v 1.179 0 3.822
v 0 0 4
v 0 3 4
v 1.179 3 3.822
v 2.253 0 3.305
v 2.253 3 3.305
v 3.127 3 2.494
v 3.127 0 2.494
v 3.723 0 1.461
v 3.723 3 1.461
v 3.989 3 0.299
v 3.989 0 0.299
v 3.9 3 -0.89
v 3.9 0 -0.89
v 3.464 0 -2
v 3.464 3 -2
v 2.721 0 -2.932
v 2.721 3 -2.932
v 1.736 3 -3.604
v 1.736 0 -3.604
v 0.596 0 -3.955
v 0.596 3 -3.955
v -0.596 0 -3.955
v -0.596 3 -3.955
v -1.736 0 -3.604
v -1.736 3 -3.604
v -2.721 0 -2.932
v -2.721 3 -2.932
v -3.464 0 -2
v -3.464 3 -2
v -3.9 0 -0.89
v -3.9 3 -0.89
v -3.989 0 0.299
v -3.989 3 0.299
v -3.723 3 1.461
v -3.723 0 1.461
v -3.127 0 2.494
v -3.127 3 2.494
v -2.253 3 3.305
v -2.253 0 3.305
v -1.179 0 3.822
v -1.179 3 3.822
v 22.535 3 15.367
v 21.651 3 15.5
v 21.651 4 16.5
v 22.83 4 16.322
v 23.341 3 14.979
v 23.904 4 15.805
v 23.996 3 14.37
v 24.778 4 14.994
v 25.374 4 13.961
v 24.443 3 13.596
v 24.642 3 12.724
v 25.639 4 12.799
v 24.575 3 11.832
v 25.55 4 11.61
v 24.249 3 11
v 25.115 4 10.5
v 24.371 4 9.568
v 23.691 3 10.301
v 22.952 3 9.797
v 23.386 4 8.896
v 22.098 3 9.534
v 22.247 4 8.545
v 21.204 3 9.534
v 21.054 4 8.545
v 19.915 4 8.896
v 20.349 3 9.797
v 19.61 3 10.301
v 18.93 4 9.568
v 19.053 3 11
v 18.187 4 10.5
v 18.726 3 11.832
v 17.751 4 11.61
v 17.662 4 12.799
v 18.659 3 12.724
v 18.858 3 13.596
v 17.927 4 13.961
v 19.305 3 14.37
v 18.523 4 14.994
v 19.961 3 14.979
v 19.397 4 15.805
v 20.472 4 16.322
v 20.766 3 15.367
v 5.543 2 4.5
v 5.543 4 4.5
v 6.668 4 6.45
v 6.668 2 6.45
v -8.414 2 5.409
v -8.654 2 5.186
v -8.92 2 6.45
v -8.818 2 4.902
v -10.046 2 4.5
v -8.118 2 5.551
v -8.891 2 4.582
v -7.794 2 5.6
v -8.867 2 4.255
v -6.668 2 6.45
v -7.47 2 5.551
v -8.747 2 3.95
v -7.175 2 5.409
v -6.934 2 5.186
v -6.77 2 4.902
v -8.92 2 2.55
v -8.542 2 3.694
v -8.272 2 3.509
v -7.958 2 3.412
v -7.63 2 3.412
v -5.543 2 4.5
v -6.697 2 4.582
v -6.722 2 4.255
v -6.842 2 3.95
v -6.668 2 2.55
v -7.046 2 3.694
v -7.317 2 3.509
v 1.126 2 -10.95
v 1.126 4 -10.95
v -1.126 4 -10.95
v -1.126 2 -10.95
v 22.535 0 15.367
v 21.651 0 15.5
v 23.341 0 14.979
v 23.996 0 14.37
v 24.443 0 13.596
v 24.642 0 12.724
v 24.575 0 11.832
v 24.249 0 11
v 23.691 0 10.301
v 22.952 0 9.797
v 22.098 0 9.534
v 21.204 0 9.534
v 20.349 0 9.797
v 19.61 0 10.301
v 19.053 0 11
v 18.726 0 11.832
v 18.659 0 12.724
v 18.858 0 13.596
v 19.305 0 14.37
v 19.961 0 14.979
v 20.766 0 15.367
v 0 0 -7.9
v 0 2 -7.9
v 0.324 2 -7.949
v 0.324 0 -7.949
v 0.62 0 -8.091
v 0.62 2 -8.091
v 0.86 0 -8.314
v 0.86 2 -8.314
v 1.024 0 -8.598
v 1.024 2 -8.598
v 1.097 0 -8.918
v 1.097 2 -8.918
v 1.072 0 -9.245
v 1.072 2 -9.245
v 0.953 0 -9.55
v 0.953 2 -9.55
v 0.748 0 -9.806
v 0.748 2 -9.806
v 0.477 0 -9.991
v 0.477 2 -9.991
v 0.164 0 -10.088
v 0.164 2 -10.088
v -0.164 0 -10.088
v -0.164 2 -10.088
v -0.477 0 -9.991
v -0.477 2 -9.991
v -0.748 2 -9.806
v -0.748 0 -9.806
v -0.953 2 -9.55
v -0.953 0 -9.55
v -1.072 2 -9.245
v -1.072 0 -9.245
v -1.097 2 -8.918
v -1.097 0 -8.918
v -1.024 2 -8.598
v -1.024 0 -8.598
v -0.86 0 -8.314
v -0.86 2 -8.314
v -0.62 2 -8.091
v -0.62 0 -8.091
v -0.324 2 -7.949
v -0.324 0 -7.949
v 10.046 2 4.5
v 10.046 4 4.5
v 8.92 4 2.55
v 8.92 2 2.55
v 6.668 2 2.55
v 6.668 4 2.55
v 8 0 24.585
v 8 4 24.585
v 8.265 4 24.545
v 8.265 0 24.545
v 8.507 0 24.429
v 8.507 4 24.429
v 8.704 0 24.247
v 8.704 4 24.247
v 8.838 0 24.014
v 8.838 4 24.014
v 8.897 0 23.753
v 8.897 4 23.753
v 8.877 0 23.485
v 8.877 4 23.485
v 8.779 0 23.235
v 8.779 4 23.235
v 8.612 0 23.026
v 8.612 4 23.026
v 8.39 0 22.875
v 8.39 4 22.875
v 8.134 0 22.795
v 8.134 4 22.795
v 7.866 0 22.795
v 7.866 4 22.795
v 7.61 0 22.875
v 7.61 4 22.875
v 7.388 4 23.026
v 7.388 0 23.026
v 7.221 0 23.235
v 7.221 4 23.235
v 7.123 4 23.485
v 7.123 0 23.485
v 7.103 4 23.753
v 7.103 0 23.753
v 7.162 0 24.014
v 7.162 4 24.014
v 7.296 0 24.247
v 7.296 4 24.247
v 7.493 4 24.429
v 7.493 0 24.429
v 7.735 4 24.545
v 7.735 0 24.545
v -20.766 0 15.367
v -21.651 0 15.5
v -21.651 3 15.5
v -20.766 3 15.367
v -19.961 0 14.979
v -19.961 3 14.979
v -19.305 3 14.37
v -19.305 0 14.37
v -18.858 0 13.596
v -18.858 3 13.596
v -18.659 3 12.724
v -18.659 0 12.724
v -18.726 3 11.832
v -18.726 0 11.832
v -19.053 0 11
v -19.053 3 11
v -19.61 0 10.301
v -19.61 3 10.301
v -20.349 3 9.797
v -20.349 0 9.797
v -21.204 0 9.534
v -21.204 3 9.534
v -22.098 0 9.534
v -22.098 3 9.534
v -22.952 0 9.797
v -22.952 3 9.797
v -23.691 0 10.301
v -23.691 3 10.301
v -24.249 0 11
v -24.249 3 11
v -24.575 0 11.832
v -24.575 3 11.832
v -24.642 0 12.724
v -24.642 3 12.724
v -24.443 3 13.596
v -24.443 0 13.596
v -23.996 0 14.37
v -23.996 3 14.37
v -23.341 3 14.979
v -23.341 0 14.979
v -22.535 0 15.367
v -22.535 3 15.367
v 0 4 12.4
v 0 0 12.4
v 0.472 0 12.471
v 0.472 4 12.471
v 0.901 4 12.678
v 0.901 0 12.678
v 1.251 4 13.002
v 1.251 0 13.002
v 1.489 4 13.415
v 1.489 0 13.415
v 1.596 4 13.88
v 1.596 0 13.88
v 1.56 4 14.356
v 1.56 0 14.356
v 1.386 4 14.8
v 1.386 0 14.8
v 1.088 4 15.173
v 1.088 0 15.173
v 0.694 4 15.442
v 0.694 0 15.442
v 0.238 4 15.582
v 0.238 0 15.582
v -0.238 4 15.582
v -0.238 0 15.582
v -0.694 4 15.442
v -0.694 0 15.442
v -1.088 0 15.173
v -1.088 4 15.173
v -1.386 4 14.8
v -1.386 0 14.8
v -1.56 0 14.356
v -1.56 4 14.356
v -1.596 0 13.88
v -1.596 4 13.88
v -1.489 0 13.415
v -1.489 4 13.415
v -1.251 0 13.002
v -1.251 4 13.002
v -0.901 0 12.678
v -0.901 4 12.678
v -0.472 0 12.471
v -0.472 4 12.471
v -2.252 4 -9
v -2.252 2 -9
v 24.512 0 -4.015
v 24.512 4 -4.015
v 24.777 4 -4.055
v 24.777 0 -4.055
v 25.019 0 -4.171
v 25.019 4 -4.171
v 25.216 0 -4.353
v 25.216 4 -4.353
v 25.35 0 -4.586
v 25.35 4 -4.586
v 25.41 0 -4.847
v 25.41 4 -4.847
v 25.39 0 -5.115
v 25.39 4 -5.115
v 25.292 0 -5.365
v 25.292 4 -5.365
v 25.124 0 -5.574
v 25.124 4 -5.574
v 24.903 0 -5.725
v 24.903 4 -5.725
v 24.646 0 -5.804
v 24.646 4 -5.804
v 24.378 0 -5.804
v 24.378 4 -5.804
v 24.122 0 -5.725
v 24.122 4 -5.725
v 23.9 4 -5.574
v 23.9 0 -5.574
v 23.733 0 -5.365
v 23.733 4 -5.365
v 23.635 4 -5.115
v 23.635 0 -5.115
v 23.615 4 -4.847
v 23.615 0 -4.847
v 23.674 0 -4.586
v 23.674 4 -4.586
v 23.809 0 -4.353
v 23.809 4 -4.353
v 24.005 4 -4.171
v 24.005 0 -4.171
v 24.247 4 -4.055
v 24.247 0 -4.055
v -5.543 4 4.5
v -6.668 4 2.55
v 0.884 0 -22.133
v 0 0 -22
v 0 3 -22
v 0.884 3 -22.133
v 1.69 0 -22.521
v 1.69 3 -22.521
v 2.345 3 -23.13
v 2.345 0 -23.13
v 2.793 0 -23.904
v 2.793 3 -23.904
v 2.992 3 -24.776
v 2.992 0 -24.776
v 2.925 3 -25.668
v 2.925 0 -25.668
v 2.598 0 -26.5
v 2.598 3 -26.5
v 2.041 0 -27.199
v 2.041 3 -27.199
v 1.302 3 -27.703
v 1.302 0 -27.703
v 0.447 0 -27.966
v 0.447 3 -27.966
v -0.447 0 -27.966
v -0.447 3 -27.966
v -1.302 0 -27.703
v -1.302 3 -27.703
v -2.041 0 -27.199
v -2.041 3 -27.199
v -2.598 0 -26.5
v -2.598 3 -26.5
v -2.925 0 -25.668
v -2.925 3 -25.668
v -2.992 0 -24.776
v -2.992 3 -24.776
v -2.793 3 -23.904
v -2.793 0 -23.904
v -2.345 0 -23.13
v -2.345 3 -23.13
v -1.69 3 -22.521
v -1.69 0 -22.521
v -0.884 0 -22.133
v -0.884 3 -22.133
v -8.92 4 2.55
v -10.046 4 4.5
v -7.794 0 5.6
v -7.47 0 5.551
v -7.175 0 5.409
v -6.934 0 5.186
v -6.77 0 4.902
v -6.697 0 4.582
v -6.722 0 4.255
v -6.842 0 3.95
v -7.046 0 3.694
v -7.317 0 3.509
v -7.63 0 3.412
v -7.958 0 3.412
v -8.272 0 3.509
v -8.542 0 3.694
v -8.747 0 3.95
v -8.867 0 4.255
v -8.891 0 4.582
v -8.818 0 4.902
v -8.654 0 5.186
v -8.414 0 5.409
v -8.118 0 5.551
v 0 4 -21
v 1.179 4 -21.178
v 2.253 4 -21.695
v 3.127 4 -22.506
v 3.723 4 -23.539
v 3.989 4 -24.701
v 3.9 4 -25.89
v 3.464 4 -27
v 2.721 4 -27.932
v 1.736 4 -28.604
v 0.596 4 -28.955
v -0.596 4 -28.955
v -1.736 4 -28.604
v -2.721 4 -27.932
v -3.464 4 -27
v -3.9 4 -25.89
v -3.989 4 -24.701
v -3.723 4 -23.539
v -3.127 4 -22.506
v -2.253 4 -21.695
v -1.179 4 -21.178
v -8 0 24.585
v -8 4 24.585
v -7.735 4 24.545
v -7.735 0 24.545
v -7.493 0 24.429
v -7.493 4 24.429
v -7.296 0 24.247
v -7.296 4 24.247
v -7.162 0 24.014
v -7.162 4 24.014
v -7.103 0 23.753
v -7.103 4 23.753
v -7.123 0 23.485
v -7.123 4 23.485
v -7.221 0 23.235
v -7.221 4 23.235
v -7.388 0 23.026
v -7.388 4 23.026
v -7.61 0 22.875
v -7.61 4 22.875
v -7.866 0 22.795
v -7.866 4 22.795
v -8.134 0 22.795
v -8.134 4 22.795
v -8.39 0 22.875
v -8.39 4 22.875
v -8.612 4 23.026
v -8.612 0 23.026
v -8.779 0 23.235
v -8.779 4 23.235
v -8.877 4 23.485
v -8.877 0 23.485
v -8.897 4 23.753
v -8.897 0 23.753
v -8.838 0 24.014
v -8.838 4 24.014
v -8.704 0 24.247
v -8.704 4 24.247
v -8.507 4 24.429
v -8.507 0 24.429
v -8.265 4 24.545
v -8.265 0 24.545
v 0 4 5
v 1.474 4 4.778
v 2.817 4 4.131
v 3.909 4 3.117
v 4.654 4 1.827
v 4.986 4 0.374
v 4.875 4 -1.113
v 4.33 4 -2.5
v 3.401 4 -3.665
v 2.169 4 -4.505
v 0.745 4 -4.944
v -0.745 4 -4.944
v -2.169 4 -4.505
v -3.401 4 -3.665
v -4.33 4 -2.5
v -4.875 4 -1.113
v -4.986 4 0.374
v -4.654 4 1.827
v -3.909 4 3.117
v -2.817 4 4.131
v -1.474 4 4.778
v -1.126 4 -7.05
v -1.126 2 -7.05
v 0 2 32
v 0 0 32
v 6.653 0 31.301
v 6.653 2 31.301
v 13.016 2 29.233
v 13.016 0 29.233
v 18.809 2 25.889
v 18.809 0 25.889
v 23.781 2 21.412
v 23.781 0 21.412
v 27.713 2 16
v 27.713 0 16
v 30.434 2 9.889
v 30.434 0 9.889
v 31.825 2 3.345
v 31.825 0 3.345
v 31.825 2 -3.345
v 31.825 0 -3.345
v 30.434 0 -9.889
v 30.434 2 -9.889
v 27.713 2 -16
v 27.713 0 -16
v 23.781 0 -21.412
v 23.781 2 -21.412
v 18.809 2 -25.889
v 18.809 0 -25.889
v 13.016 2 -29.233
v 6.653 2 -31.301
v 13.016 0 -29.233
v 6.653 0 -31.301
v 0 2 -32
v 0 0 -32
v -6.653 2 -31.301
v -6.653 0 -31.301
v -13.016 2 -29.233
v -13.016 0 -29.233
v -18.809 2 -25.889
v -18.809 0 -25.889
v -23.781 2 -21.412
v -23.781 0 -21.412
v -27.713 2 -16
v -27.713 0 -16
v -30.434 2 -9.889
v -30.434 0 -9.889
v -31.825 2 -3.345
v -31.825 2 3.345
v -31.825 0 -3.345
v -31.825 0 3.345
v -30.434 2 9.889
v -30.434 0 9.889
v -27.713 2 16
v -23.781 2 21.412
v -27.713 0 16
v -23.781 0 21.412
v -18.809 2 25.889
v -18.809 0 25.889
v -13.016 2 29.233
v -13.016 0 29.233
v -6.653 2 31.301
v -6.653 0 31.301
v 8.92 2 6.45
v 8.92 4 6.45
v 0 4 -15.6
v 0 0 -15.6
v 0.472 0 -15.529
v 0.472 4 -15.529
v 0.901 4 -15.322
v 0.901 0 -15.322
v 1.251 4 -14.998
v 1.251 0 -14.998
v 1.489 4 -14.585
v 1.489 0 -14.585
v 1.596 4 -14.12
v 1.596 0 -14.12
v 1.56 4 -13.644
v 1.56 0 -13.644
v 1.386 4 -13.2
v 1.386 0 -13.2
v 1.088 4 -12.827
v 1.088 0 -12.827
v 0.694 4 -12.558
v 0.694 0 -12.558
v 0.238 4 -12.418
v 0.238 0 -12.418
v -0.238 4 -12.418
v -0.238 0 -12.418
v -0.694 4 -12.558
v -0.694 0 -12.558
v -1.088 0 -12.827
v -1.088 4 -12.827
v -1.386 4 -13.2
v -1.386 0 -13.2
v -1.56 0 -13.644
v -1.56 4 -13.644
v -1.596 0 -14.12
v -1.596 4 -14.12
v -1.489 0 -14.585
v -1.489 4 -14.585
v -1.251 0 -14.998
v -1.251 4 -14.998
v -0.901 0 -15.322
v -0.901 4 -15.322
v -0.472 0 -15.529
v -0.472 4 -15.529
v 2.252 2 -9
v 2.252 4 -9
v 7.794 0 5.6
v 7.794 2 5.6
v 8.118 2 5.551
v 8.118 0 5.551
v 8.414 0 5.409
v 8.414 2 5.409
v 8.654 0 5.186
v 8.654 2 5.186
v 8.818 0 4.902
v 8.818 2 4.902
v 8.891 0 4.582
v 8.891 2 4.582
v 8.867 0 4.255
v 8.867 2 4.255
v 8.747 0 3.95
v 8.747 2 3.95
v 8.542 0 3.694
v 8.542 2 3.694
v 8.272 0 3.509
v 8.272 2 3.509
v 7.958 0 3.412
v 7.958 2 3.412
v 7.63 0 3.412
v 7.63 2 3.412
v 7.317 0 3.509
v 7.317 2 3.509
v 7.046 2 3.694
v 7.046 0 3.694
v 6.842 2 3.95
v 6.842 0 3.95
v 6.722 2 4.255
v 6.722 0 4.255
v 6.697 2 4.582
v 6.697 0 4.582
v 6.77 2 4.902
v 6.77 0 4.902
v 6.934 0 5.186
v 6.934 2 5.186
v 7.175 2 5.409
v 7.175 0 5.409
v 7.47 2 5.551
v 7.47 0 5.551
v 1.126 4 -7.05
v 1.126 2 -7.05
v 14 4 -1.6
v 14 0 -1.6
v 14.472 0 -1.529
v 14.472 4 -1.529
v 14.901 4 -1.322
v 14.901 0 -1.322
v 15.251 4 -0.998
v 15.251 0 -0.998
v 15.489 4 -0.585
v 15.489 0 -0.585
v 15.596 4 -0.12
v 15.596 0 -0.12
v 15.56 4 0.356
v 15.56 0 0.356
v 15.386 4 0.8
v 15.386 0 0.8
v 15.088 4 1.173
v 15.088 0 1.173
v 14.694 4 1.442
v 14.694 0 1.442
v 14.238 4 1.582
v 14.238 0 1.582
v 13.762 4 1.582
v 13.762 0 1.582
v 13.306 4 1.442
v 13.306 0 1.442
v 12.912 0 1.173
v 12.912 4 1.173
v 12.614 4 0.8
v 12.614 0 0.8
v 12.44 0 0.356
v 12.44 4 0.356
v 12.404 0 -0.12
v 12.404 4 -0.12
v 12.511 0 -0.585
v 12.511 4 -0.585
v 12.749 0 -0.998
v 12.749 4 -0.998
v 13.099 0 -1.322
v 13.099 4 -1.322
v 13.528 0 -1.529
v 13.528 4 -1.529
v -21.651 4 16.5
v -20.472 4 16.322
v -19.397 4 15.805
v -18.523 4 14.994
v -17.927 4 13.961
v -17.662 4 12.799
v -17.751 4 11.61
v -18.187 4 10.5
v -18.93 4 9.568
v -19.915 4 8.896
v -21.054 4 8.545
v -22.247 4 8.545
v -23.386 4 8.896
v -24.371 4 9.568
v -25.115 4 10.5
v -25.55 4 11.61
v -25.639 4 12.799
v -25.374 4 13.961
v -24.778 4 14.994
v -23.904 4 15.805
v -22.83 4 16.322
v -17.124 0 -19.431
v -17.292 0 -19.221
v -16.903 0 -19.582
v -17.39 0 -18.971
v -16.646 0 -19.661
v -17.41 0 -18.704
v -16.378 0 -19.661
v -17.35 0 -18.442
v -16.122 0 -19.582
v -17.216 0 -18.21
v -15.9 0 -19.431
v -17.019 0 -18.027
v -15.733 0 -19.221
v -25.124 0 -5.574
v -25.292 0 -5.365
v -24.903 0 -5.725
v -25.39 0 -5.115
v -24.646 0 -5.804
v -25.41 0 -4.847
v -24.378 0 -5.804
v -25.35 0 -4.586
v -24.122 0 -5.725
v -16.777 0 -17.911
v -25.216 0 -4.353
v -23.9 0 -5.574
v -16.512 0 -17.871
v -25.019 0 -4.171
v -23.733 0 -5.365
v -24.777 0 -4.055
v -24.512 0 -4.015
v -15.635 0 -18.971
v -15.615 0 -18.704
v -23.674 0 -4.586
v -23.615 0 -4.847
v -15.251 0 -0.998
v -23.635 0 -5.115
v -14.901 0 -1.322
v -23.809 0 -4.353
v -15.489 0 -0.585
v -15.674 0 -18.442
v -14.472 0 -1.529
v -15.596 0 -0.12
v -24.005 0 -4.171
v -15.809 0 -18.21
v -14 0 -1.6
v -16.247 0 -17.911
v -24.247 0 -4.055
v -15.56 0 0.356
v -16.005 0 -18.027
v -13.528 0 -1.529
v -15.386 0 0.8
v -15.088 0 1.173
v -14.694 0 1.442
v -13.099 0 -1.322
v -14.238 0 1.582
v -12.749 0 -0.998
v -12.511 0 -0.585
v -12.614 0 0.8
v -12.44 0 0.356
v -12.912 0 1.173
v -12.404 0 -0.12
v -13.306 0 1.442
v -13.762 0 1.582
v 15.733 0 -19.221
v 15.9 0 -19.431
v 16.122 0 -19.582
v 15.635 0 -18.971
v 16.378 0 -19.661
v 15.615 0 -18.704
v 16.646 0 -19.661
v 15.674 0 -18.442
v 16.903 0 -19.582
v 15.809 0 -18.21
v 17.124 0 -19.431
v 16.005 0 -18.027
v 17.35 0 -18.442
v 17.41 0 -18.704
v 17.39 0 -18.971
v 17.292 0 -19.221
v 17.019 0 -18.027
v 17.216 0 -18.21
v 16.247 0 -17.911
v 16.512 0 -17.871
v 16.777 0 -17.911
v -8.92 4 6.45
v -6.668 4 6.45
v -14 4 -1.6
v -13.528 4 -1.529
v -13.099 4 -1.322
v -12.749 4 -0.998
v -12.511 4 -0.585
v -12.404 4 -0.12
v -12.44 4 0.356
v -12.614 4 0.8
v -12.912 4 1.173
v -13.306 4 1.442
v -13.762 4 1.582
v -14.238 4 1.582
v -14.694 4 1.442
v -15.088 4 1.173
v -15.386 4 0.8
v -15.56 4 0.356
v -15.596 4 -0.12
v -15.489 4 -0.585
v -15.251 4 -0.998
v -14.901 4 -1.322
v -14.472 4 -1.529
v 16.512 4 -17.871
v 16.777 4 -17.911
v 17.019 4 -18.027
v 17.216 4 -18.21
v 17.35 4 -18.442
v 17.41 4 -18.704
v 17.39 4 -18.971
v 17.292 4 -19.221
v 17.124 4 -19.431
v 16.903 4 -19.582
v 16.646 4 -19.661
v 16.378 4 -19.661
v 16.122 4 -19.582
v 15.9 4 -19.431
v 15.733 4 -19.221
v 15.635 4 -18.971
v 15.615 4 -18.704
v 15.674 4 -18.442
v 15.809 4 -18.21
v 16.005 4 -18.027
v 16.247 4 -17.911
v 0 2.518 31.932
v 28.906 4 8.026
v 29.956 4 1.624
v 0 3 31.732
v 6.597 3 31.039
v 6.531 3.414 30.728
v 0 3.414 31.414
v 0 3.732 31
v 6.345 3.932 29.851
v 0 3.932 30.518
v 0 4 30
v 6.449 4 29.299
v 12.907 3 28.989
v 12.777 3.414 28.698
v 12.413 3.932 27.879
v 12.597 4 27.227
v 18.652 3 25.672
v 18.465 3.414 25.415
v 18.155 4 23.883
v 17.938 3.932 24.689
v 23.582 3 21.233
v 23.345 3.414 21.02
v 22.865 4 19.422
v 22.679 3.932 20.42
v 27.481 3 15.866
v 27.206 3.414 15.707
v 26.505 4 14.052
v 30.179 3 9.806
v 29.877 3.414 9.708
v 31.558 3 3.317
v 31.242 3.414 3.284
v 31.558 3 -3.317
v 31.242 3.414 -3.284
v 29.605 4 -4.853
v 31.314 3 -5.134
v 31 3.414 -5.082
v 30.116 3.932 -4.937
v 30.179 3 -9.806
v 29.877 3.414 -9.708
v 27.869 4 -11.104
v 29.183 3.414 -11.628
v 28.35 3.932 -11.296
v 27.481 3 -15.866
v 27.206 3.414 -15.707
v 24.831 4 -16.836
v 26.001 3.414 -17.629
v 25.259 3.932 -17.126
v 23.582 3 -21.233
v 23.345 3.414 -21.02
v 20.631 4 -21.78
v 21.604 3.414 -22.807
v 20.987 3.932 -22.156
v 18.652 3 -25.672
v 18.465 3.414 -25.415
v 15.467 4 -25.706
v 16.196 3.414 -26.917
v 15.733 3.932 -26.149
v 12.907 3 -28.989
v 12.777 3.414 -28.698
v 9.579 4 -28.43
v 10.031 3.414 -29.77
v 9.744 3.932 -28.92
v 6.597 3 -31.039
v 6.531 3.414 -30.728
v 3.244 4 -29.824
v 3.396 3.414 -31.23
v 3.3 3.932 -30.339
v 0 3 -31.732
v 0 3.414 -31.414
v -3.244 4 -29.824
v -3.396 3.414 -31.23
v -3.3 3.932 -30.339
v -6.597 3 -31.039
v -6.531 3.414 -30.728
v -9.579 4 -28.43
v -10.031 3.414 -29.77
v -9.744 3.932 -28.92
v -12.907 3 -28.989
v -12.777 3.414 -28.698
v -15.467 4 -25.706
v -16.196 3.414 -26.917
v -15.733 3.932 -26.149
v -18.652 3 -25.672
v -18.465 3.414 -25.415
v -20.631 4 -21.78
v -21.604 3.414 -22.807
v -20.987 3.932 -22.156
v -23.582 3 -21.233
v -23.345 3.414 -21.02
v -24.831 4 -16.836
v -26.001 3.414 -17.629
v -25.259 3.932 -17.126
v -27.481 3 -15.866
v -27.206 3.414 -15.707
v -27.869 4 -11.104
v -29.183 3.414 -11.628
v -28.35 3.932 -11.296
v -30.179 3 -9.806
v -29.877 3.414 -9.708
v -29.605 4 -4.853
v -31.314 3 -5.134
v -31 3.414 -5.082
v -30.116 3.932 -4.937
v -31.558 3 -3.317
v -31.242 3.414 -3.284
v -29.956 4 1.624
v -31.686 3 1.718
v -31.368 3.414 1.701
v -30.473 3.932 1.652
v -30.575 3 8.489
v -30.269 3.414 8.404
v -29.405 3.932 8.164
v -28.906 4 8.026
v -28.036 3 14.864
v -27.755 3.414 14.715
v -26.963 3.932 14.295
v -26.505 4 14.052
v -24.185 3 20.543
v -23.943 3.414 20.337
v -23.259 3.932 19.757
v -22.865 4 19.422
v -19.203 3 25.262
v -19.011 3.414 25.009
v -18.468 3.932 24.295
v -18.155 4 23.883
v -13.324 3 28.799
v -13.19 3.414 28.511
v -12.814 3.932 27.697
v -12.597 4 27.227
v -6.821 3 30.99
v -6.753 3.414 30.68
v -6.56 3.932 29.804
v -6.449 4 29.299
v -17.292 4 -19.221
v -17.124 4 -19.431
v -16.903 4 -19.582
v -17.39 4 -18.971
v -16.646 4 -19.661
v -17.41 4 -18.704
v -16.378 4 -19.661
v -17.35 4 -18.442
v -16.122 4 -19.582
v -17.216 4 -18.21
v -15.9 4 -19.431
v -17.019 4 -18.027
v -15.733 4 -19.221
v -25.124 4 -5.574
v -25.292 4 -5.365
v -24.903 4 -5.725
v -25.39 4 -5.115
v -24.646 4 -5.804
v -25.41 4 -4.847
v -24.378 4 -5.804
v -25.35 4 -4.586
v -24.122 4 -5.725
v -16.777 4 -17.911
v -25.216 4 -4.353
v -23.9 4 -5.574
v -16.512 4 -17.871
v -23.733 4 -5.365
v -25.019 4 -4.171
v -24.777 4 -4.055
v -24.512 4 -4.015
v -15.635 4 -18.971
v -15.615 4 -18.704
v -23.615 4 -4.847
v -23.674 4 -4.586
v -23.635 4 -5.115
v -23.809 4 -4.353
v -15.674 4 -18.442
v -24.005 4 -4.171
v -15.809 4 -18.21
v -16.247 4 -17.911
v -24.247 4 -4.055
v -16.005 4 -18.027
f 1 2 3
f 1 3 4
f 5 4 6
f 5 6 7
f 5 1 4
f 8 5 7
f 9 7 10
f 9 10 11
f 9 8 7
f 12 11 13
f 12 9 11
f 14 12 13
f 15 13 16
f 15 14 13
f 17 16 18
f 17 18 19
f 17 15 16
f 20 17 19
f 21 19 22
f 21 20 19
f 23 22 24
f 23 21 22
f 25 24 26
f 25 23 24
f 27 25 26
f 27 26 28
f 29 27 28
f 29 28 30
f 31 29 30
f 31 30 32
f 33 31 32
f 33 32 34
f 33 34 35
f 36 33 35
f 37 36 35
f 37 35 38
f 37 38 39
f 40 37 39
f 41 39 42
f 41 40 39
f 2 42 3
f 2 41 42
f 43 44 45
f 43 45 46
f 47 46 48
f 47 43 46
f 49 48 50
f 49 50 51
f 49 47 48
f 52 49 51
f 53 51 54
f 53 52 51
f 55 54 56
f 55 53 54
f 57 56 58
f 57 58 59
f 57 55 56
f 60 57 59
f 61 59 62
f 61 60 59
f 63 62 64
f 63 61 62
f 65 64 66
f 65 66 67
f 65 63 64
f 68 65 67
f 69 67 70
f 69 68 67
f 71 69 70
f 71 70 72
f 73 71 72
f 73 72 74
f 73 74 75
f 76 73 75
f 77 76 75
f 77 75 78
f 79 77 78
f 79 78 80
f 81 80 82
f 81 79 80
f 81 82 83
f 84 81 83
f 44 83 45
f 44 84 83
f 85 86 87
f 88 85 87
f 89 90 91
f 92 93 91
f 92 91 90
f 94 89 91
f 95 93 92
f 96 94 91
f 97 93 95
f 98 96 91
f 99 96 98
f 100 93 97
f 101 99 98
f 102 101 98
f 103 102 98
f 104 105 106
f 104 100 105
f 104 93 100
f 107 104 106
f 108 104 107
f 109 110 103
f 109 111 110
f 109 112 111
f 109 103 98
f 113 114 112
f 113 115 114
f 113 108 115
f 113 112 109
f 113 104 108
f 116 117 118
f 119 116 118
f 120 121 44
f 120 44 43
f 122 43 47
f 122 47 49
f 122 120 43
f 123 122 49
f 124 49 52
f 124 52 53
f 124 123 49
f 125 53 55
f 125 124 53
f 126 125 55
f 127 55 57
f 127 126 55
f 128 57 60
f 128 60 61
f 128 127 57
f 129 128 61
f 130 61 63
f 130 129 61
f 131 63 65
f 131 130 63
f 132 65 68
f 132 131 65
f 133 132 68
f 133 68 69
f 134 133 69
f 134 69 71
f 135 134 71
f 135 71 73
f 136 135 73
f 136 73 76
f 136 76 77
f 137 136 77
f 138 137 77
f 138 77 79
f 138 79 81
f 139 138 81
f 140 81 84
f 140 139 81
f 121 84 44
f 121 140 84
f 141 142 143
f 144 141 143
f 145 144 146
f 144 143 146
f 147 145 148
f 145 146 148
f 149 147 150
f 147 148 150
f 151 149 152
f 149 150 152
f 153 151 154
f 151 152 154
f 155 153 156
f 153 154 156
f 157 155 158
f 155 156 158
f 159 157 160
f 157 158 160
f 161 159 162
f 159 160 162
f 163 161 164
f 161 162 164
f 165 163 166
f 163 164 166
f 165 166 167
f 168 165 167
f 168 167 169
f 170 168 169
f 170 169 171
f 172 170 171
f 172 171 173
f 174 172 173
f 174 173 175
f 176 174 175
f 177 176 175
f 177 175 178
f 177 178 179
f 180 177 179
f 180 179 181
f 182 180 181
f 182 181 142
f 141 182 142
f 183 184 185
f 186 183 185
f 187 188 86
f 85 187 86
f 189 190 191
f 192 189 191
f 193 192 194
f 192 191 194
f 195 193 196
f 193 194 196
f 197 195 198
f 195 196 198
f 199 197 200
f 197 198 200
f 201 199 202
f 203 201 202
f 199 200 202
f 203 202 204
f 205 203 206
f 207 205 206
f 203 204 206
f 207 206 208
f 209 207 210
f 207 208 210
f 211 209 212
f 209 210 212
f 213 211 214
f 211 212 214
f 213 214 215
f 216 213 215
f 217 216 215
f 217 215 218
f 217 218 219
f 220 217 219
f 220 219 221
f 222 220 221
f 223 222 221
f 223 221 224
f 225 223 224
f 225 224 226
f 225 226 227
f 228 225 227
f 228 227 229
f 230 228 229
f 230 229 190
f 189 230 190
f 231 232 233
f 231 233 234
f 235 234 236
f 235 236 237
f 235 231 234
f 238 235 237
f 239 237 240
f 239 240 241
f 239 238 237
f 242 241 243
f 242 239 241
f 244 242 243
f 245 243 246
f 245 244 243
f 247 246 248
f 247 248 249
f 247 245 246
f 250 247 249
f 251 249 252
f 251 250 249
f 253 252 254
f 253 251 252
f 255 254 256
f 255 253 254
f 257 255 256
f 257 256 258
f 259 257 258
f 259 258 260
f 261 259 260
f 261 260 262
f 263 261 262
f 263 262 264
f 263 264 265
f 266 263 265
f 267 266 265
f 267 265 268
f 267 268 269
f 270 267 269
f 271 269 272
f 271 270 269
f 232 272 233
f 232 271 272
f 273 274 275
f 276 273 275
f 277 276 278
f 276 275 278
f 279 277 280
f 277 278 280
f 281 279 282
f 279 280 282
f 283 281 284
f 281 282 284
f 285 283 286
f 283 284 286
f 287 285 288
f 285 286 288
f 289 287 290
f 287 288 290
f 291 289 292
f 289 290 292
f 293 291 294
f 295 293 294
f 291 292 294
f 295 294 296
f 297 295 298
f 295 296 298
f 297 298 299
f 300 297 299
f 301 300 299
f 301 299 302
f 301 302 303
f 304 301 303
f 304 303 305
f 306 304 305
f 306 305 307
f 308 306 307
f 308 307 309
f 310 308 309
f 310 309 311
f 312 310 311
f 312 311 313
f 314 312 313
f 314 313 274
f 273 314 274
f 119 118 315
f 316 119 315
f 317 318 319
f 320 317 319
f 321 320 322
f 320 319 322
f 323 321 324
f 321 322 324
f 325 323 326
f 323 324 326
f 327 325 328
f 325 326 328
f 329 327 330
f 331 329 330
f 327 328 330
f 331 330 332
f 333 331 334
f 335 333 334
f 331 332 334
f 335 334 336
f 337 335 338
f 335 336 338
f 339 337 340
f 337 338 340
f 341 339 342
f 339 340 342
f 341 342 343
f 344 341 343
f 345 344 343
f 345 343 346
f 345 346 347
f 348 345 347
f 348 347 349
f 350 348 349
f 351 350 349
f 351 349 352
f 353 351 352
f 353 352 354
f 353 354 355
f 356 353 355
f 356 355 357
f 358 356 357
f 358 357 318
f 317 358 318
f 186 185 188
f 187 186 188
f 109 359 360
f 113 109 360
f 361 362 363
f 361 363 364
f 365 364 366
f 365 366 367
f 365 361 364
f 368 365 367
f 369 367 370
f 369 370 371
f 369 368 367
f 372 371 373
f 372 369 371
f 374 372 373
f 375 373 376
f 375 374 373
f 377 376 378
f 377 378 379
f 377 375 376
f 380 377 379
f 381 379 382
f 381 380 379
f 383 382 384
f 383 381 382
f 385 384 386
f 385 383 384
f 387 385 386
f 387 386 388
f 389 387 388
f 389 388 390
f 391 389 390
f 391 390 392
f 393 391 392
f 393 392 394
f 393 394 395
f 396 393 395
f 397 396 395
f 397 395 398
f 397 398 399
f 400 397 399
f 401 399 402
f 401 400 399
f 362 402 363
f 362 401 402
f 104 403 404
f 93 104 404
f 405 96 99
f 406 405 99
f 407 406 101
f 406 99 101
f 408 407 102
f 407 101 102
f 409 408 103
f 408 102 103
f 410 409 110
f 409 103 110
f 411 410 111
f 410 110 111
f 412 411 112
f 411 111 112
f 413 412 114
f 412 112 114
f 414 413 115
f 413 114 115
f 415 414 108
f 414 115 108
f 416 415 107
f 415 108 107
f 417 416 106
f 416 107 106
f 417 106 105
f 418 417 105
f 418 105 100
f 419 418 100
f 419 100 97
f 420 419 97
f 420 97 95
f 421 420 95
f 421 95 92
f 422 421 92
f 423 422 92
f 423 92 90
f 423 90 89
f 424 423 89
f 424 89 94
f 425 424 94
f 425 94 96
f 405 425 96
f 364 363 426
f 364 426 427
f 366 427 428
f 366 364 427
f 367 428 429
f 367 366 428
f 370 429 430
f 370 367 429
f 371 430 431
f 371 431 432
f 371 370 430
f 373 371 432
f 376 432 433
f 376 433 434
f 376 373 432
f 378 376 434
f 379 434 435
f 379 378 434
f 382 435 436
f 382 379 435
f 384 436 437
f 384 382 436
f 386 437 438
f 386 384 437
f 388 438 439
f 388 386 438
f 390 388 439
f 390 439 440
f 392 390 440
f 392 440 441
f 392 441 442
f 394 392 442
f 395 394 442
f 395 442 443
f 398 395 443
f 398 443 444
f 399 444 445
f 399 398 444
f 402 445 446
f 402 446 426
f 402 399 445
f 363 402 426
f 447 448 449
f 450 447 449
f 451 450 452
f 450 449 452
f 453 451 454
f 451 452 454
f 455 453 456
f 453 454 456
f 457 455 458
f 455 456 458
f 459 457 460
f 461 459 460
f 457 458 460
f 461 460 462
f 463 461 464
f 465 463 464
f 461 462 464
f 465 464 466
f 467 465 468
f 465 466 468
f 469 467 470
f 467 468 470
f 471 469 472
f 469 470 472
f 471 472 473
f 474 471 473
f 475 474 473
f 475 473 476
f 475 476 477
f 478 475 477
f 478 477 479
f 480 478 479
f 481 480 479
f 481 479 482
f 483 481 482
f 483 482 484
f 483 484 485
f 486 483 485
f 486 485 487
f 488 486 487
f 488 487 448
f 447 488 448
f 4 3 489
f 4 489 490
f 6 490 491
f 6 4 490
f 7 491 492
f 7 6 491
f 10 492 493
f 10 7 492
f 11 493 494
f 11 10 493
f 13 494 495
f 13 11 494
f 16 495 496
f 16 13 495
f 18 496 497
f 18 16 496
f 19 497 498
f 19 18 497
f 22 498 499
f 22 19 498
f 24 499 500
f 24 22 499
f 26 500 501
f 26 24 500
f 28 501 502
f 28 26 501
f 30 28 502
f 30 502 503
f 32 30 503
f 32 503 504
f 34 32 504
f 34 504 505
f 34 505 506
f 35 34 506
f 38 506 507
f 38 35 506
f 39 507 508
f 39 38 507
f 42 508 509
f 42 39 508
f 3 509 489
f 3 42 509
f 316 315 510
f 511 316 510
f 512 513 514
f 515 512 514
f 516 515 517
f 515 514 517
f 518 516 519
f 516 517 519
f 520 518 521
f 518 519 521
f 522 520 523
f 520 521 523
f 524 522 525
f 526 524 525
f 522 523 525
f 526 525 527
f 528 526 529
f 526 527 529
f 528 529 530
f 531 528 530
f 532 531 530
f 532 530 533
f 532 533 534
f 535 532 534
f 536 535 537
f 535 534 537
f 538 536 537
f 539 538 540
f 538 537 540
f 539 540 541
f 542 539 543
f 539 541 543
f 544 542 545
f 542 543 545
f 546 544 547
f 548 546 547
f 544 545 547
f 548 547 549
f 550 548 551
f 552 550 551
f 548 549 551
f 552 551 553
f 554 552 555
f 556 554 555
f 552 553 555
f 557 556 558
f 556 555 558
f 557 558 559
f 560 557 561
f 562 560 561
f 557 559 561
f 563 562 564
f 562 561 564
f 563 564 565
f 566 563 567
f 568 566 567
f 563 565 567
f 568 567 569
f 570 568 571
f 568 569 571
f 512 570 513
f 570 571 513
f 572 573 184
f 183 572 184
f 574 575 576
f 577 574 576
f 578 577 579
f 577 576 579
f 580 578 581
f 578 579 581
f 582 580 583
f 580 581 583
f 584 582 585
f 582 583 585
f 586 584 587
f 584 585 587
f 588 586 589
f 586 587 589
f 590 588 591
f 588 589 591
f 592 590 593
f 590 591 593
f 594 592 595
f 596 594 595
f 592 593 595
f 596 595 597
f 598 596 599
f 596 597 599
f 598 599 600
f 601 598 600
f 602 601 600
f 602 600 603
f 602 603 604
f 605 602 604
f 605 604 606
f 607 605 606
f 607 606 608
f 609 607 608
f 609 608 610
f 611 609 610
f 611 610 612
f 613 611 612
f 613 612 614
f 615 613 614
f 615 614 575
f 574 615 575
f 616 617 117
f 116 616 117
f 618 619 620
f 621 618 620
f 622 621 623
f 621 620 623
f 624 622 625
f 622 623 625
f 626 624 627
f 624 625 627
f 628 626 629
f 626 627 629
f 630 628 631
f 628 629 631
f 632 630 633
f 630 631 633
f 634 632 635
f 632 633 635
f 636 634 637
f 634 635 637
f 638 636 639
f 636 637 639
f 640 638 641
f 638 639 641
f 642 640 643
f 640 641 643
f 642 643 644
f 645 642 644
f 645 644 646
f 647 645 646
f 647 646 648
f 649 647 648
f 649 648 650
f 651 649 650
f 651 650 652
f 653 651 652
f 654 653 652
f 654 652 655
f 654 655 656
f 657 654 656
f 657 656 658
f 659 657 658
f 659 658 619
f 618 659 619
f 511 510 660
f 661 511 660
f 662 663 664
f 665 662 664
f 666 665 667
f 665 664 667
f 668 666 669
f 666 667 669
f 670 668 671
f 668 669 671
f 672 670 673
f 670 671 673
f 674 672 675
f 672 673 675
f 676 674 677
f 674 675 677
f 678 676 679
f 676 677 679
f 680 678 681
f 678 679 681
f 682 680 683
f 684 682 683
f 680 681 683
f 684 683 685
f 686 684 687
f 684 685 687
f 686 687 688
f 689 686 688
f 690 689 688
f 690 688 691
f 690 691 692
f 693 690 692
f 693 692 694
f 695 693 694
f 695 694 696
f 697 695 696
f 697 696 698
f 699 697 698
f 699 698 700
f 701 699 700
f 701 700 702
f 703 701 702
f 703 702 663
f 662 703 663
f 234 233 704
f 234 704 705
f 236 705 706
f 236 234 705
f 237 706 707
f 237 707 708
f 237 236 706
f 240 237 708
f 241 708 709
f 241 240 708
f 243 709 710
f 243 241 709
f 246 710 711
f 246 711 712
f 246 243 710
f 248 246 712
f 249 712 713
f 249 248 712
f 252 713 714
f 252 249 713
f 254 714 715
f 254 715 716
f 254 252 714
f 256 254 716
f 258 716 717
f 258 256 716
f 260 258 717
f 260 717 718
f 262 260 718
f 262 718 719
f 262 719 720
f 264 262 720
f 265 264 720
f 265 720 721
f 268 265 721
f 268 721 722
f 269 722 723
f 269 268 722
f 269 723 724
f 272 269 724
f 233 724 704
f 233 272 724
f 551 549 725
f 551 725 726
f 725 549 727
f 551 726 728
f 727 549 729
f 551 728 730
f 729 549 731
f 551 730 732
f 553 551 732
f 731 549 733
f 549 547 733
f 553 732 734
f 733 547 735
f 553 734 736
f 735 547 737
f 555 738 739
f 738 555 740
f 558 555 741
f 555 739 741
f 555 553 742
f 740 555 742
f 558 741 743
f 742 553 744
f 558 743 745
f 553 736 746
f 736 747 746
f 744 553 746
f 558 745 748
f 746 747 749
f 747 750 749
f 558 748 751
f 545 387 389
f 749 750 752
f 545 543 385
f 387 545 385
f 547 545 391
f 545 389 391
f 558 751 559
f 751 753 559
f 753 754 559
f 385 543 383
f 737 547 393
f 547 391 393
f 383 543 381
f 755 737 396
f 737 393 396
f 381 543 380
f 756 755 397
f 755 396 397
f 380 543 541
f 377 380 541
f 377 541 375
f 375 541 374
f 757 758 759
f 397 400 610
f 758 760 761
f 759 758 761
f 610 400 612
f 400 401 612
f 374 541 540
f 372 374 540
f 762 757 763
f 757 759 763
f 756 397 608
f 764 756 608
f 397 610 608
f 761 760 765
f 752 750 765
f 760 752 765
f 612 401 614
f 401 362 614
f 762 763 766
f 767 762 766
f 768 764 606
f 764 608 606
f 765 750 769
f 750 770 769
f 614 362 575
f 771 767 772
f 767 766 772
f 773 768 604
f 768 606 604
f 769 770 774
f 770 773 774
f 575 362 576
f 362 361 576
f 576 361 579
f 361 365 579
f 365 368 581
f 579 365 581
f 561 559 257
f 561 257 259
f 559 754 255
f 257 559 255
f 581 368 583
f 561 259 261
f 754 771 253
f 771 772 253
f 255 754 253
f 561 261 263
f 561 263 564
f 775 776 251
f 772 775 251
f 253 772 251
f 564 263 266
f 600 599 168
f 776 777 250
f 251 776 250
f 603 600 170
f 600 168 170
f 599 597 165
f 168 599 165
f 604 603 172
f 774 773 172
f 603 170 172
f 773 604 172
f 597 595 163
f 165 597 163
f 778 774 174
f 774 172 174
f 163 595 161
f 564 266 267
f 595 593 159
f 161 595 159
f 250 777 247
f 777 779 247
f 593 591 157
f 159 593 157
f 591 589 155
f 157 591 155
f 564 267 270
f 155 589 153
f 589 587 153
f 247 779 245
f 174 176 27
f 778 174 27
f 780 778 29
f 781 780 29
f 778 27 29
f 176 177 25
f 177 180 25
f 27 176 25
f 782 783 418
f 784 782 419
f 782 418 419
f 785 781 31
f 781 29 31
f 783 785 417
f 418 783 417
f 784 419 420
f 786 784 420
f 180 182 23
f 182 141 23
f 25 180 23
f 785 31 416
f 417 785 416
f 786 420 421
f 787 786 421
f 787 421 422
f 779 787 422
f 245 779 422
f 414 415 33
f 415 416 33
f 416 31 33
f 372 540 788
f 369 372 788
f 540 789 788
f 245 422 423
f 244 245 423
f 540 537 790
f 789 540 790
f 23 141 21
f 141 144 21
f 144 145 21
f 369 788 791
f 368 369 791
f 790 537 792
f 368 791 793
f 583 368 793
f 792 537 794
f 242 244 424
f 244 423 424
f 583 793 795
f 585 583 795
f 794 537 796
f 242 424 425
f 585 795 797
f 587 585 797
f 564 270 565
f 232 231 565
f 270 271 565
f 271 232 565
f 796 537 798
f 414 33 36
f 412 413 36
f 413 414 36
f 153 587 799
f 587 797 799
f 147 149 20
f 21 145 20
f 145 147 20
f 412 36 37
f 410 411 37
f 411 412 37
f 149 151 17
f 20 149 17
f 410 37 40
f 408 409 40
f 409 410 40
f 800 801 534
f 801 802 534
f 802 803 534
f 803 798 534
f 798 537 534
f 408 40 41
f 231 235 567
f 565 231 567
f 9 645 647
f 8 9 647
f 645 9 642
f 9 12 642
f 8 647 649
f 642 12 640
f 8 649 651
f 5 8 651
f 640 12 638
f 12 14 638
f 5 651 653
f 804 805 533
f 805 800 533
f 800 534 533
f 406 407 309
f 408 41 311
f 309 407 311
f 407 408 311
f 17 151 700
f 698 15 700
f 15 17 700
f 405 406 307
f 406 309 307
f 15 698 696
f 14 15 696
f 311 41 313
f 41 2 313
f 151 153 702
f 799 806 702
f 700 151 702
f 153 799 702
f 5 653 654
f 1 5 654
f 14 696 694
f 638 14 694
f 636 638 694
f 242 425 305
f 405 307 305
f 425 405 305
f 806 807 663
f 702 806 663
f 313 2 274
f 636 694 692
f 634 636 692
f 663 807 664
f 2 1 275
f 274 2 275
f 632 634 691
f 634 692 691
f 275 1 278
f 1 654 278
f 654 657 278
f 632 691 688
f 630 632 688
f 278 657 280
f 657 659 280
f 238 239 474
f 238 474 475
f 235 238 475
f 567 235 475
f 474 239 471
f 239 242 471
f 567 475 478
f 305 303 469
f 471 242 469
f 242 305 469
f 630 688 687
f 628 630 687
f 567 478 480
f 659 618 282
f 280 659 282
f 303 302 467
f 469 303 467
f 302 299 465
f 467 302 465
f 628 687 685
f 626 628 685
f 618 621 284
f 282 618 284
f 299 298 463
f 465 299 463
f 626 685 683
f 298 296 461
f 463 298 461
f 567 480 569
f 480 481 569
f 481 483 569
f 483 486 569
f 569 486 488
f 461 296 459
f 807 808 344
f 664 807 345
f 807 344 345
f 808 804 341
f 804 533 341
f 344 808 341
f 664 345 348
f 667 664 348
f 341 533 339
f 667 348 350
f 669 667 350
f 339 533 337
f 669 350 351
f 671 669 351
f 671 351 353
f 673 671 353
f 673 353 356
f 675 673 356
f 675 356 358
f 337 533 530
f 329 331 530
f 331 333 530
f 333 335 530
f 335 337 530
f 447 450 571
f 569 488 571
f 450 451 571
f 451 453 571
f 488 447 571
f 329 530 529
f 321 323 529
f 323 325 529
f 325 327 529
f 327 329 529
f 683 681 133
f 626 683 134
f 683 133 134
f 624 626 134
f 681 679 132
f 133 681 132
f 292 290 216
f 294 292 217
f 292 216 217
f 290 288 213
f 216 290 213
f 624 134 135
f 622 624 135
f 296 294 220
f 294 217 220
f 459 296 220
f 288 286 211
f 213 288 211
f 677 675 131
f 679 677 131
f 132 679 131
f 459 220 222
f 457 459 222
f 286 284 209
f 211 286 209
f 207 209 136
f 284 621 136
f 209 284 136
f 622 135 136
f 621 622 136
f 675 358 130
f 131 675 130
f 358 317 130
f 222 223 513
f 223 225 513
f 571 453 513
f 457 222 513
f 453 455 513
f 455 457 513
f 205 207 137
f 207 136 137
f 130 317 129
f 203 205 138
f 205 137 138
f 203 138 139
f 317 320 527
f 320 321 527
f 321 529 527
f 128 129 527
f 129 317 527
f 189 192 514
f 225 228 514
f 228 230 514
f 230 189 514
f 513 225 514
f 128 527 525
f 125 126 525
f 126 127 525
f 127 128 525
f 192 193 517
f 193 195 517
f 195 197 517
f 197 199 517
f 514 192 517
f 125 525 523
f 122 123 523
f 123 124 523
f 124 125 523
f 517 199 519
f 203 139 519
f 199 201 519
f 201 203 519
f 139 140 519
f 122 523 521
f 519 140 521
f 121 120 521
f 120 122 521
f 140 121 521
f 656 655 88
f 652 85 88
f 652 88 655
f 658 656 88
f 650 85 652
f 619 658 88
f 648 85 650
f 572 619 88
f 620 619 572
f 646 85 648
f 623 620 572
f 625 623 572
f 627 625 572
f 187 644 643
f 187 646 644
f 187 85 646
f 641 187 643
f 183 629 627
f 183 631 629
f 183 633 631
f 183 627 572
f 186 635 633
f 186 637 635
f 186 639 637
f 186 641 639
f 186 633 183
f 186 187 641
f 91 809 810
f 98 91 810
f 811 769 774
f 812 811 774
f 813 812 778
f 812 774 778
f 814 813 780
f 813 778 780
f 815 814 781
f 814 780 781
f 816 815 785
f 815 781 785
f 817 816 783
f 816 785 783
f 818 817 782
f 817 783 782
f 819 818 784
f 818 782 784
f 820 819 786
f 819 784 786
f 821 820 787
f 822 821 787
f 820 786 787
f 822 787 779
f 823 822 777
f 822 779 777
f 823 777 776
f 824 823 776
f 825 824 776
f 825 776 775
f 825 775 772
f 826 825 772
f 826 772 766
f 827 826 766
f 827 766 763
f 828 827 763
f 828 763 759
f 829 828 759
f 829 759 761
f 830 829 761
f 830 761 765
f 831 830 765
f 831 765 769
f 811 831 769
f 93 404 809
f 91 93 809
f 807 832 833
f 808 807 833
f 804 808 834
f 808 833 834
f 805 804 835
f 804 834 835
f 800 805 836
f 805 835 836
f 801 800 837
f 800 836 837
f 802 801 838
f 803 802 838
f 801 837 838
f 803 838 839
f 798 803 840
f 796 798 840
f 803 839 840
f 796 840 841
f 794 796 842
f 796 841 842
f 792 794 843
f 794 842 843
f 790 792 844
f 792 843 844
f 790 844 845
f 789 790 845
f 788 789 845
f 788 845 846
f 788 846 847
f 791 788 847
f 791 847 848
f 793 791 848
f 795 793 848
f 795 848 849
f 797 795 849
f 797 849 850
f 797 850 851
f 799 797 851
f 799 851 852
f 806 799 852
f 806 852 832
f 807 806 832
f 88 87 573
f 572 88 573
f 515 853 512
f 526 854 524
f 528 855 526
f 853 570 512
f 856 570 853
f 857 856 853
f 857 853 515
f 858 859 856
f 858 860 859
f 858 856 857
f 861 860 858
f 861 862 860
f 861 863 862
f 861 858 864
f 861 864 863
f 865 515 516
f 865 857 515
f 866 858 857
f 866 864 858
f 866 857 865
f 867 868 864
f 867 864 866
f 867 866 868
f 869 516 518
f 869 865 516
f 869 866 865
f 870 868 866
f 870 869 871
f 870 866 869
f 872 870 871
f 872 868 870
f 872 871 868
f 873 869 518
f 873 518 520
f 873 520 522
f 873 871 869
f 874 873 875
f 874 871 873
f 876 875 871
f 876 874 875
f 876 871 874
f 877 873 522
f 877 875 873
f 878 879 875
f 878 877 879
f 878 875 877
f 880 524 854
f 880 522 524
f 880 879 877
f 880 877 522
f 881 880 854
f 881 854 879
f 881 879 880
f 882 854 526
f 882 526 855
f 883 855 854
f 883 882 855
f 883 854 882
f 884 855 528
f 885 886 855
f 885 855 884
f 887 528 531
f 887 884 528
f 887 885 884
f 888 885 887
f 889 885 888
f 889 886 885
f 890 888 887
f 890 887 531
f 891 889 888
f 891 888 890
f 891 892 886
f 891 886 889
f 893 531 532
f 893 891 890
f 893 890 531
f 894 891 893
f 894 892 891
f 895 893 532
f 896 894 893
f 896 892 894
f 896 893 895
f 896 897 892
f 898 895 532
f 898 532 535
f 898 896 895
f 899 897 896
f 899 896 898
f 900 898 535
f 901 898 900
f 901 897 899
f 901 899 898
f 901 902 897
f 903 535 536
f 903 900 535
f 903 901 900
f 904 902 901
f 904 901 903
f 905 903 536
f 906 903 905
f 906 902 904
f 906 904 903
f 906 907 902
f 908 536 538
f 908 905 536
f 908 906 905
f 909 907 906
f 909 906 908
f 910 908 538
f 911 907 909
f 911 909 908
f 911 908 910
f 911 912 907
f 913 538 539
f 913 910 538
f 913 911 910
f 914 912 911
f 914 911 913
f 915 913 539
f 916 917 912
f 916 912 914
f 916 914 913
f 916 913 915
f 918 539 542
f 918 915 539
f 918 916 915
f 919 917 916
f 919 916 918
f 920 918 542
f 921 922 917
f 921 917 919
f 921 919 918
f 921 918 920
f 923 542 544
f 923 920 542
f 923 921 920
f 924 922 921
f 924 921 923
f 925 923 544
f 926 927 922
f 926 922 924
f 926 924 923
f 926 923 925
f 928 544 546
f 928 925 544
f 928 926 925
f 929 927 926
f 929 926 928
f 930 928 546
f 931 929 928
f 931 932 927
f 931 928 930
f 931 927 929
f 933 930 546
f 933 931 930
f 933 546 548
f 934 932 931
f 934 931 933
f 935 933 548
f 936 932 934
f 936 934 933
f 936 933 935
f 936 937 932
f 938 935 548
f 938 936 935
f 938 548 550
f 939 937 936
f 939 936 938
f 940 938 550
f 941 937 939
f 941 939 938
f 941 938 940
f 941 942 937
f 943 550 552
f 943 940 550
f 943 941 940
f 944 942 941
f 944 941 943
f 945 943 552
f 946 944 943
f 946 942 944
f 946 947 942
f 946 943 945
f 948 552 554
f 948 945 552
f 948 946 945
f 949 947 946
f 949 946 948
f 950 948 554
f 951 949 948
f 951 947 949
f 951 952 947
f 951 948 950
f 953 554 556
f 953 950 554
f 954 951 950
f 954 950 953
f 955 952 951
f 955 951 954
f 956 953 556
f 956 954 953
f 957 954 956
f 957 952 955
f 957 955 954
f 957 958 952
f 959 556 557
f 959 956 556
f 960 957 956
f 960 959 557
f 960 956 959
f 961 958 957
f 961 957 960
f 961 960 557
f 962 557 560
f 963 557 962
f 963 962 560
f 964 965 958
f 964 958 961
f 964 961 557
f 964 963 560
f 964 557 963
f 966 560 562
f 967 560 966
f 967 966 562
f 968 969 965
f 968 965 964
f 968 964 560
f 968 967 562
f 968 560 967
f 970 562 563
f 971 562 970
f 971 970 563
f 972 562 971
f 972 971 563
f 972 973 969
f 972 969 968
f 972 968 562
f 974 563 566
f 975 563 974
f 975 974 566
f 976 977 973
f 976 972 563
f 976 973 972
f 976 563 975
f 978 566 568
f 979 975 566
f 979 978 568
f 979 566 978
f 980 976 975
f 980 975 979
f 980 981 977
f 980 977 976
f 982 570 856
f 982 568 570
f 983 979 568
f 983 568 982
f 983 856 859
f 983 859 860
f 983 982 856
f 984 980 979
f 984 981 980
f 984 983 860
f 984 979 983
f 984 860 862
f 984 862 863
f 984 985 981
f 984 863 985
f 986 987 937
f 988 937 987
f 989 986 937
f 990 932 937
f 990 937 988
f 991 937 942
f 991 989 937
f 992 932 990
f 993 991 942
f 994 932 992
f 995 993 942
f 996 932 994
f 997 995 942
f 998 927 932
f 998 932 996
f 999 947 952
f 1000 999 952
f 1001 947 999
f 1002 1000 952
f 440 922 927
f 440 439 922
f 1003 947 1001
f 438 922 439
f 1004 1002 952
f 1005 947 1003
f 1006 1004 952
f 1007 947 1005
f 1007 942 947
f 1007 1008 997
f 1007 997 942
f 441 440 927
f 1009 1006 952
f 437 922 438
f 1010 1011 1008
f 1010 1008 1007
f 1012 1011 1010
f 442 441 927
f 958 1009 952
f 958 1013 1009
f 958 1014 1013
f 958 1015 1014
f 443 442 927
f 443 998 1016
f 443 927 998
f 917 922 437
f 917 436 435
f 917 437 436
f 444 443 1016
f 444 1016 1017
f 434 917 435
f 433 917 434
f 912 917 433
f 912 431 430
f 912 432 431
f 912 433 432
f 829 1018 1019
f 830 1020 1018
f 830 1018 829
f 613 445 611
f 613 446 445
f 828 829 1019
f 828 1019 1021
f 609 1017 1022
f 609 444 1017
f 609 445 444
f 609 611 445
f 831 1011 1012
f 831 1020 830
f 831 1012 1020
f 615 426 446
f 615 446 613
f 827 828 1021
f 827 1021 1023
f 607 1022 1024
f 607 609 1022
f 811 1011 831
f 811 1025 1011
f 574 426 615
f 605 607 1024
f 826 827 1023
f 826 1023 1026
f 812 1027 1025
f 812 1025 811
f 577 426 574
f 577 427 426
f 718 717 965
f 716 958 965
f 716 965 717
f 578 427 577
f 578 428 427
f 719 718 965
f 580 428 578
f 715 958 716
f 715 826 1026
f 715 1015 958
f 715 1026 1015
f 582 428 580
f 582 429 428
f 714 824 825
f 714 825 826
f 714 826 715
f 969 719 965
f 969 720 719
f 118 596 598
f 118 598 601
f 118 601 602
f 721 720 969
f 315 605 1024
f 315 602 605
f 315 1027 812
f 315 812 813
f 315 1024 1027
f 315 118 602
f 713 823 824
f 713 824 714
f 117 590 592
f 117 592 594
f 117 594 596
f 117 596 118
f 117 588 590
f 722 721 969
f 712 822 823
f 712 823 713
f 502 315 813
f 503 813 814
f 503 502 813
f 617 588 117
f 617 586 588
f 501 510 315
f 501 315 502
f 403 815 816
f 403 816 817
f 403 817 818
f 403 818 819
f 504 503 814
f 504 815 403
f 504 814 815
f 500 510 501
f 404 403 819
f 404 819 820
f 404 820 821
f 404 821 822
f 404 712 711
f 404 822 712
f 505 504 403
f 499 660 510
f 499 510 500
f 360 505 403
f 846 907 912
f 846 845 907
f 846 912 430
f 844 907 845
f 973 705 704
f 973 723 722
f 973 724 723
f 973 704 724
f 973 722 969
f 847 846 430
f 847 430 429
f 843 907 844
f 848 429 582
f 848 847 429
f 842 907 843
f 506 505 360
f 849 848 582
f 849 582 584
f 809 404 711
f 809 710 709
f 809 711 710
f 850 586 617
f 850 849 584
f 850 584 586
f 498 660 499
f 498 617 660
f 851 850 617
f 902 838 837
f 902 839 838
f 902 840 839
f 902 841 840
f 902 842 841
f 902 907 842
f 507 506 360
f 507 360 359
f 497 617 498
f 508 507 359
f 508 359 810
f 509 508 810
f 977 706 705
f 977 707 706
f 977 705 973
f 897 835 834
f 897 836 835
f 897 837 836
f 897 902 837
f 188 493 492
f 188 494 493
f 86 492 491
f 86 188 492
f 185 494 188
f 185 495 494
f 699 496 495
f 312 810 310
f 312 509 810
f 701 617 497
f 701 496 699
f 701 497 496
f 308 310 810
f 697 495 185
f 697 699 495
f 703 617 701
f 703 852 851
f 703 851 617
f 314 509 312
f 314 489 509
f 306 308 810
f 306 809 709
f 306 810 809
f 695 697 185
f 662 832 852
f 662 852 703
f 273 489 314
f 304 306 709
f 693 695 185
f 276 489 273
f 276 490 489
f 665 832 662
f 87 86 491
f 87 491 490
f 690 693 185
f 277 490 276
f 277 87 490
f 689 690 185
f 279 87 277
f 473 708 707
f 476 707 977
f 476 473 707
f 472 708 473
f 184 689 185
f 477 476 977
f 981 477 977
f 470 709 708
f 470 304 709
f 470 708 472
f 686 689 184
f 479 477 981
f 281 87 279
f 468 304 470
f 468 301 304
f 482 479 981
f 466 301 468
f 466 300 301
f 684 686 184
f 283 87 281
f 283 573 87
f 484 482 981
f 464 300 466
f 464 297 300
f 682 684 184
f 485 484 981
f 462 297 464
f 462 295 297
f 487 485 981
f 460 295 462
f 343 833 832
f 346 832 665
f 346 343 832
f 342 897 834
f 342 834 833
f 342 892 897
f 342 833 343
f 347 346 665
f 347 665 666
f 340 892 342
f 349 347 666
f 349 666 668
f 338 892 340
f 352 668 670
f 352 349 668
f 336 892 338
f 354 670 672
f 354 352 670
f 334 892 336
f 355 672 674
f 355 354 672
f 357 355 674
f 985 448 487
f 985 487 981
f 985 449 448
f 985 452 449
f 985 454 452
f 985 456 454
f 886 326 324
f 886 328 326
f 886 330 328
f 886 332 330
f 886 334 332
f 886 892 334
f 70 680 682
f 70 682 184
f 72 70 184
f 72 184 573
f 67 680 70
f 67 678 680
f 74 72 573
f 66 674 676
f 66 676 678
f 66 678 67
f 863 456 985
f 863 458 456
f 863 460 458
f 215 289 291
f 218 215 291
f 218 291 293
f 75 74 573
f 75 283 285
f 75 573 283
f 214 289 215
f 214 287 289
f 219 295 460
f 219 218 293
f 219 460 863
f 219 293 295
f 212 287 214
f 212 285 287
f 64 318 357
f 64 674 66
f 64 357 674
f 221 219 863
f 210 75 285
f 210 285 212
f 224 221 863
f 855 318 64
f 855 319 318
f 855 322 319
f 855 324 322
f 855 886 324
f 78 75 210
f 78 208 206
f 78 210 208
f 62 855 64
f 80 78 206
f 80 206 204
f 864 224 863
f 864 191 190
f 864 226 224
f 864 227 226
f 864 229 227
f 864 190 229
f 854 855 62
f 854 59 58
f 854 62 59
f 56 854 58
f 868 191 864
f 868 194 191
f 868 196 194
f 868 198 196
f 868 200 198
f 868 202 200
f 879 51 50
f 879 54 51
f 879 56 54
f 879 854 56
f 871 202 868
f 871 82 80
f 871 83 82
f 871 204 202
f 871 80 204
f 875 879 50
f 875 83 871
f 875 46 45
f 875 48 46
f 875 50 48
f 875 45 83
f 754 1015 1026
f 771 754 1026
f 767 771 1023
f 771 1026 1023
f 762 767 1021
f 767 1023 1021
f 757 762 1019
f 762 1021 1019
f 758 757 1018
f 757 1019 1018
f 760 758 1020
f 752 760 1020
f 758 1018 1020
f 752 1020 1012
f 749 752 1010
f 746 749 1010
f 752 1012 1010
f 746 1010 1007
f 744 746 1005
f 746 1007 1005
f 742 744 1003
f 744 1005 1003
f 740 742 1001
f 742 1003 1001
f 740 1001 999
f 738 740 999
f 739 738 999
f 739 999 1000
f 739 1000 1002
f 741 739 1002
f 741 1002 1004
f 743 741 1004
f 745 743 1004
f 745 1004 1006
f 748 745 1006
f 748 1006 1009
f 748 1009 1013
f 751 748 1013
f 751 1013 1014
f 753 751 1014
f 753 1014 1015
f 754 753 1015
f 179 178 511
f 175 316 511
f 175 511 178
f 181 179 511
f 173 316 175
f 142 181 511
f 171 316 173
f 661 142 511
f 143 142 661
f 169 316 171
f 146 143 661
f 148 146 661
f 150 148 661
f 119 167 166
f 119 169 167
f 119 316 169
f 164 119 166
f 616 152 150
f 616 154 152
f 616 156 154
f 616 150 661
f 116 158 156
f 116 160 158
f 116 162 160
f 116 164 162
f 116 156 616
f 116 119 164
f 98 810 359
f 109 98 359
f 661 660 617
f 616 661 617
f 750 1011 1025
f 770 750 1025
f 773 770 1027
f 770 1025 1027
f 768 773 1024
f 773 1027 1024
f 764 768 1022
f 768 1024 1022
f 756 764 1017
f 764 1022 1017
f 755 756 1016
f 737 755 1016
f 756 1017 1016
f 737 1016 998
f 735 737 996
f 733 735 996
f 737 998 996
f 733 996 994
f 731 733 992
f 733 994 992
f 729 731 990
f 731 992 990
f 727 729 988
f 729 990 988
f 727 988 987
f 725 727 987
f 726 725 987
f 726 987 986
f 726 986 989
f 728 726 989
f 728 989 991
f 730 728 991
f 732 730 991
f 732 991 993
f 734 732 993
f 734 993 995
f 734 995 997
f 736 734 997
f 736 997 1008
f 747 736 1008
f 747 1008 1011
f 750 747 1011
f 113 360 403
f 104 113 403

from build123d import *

# Parameters (mm, degrees)
SKETCH_1_R          = 32
SKETCH_1_R_2        = 4
SKETCH_1_R_3        = 3
EXTRUDE_1_DEPTH     = 4
FILLET_1_R          = 2
SKETCH_2_R          = 1.1
CUT_EXTRUDE_1_DEPTH = 46.431266766
SKETCH_3_R          = 1.6
CUT_EXTRUDE_2_DEPTH = 46.431266766
CUT_EXTRUDE_3_DEPTH = 2
CHAMFER_1_SIZE      = 1
SKETCH_5_R          = 0.9
CUT_EXTRUDE_4_DEPTH = 46.431266766


with BuildPart() as part:
    # Эскиз1 → Бобышка-Вытянуть1 (new body)
    with BuildSketch(Plane(origin=(0, 0, 0), x_dir=(1, 0, 0), z_dir=(0, 1, 0))):
        with Locations(Location((0, 0, 0), (0, 0, 270))):
            Circle(SKETCH_1_R)
        with Locations(Location((0, 0, 0), (0, 0, 270))):
            Circle(SKETCH_1_R_2, mode=Mode.SUBTRACT)
        with Locations(Location((0, 25, 0), (0, 0, 270))):
            Circle(SKETCH_1_R_3, mode=Mode.SUBTRACT)
        with Locations(Location((21.650635095, -12.5, 0), (0, 0, 270))):
            Circle(SKETCH_1_R_3, mode=Mode.SUBTRACT)
        with Locations(Location((-21.650635095, -12.5, 0), (0, 0, 270))):
            Circle(SKETCH_1_R_3, mode=Mode.SUBTRACT)
    extrude(amount=EXTRUDE_1_DEPTH)

    # Скругление1
    fillet_1_edges = [part.edges().sort_by_distance(p)[0] for p in [
        (0, 4, -32),
    ]]
    fillet(fillet_1_edges, radius=FILLET_1_R)

    # Эскиз2 → Вырез-Вытянуть1 (cut, through all)
    with BuildSketch(Plane(origin=(0, 4, 0), x_dir=(1, 0, 0), z_dir=(0, 1, 0))):
        with Locations(Location((0, 9, 0), (0, 0, 270))):
            Circle(SKETCH_2_R)
        with Locations(Location((7.794228634, -4.5, 0), (0, 0, 270))):
            Circle(SKETCH_2_R)
        with Locations(Location((-7.794228634, -4.5, 0), (0, 0, 270))):
            Circle(SKETCH_2_R)
    extrude(amount=-CUT_EXTRUDE_1_DEPTH, mode=Mode.SUBTRACT)

    # Эскиз3 → Вырез-Вытянуть2 (cut, through all)
    with BuildSketch(Plane.XZ):
        with Locations(Location((0, 14, 0), (0, 0, 270))):
            Circle(SKETCH_3_R)
        with Locations(Location((14, 0, 0), (0, 0, 270))):
            Circle(SKETCH_3_R)
        with Locations(Location((0, -14, 0), (0, 0, 270))):
            Circle(SKETCH_3_R)
        with Locations(Location((-14, 0, 0), (0, 0, 270))):
            Circle(SKETCH_3_R)
    extrude(amount=-CUT_EXTRUDE_2_DEPTH, mode=Mode.SUBTRACT)

    # Эскиз4 → Вырез-Вытянуть3 (cut)
    with BuildSketch(Plane(origin=(0, 4, 0), x_dir=(1, 0, 0), z_dir=(0, 1, 0))):
        Polygon((5.542562584, -4.5), (6.668395609, -6.45), (8.920061659, -6.45), (10.045894684, -4.5), (8.920061659, -2.55), (6.668395609, -2.55), align=None)
        Polygon((1.125833025, 7.05), (2.25166605, 9), (1.125833025, 10.95), (-1.125833025, 10.95), (-2.25166605, 9), (-1.125833025, 7.05), align=None)
        Polygon((-6.668395609, -2.55), (-8.920061659, -2.55), (-10.045894684, -4.5), (-8.920061659, -6.45), (-6.668395609, -6.45), (-5.542562584, -4.5), align=None)
    extrude(amount=-CUT_EXTRUDE_3_DEPTH, mode=Mode.SUBTRACT)

    # Фаска1
    chamfer_1_edges = [part.edges().sort_by_distance(p)[0] for p in [
        (21.650635095, 4, 9.5),
        (-21.650635095, 4, 9.5),
        (0, 4, -4),
        (0, 4, -28),
    ]]
    chamfer(chamfer_1_edges, length=CHAMFER_1_SIZE)

    # Эскиз5 → Вырез-Вытянуть4 (cut, through all)
    with BuildSketch(Plane(origin=(0, 4, 0), x_dir=(1, 0, 0), z_dir=(0, 1, 0))):
        with Locations(Location((-8, -23.685438565, 0), (0, 0, 270))):
            Circle(SKETCH_5_R)
        with Locations(Location((8, -23.685438565, 0), (0, 0, 270))):
            Circle(SKETCH_5_R)
        with Locations(Location((-16.512191497, 18.770922513, 0), (0, 0, 270))):
            Circle(SKETCH_5_R)
        with Locations(Location((-24.512191497, 4.914516052, 0), (0, 0, 270))):
            Circle(SKETCH_5_R)
        with Locations(Location((24.512191497, 4.914516052, 0), (0, 0, 270))):
            Circle(SKETCH_5_R)
        with Locations(Location((16.512191497, 18.770922513, 0), (0, 0, 270))):
            Circle(SKETCH_5_R)
    extrude(amount=-CUT_EXTRUDE_4_DEPTH, mode=Mode.SUBTRACT)


solid = part.part
